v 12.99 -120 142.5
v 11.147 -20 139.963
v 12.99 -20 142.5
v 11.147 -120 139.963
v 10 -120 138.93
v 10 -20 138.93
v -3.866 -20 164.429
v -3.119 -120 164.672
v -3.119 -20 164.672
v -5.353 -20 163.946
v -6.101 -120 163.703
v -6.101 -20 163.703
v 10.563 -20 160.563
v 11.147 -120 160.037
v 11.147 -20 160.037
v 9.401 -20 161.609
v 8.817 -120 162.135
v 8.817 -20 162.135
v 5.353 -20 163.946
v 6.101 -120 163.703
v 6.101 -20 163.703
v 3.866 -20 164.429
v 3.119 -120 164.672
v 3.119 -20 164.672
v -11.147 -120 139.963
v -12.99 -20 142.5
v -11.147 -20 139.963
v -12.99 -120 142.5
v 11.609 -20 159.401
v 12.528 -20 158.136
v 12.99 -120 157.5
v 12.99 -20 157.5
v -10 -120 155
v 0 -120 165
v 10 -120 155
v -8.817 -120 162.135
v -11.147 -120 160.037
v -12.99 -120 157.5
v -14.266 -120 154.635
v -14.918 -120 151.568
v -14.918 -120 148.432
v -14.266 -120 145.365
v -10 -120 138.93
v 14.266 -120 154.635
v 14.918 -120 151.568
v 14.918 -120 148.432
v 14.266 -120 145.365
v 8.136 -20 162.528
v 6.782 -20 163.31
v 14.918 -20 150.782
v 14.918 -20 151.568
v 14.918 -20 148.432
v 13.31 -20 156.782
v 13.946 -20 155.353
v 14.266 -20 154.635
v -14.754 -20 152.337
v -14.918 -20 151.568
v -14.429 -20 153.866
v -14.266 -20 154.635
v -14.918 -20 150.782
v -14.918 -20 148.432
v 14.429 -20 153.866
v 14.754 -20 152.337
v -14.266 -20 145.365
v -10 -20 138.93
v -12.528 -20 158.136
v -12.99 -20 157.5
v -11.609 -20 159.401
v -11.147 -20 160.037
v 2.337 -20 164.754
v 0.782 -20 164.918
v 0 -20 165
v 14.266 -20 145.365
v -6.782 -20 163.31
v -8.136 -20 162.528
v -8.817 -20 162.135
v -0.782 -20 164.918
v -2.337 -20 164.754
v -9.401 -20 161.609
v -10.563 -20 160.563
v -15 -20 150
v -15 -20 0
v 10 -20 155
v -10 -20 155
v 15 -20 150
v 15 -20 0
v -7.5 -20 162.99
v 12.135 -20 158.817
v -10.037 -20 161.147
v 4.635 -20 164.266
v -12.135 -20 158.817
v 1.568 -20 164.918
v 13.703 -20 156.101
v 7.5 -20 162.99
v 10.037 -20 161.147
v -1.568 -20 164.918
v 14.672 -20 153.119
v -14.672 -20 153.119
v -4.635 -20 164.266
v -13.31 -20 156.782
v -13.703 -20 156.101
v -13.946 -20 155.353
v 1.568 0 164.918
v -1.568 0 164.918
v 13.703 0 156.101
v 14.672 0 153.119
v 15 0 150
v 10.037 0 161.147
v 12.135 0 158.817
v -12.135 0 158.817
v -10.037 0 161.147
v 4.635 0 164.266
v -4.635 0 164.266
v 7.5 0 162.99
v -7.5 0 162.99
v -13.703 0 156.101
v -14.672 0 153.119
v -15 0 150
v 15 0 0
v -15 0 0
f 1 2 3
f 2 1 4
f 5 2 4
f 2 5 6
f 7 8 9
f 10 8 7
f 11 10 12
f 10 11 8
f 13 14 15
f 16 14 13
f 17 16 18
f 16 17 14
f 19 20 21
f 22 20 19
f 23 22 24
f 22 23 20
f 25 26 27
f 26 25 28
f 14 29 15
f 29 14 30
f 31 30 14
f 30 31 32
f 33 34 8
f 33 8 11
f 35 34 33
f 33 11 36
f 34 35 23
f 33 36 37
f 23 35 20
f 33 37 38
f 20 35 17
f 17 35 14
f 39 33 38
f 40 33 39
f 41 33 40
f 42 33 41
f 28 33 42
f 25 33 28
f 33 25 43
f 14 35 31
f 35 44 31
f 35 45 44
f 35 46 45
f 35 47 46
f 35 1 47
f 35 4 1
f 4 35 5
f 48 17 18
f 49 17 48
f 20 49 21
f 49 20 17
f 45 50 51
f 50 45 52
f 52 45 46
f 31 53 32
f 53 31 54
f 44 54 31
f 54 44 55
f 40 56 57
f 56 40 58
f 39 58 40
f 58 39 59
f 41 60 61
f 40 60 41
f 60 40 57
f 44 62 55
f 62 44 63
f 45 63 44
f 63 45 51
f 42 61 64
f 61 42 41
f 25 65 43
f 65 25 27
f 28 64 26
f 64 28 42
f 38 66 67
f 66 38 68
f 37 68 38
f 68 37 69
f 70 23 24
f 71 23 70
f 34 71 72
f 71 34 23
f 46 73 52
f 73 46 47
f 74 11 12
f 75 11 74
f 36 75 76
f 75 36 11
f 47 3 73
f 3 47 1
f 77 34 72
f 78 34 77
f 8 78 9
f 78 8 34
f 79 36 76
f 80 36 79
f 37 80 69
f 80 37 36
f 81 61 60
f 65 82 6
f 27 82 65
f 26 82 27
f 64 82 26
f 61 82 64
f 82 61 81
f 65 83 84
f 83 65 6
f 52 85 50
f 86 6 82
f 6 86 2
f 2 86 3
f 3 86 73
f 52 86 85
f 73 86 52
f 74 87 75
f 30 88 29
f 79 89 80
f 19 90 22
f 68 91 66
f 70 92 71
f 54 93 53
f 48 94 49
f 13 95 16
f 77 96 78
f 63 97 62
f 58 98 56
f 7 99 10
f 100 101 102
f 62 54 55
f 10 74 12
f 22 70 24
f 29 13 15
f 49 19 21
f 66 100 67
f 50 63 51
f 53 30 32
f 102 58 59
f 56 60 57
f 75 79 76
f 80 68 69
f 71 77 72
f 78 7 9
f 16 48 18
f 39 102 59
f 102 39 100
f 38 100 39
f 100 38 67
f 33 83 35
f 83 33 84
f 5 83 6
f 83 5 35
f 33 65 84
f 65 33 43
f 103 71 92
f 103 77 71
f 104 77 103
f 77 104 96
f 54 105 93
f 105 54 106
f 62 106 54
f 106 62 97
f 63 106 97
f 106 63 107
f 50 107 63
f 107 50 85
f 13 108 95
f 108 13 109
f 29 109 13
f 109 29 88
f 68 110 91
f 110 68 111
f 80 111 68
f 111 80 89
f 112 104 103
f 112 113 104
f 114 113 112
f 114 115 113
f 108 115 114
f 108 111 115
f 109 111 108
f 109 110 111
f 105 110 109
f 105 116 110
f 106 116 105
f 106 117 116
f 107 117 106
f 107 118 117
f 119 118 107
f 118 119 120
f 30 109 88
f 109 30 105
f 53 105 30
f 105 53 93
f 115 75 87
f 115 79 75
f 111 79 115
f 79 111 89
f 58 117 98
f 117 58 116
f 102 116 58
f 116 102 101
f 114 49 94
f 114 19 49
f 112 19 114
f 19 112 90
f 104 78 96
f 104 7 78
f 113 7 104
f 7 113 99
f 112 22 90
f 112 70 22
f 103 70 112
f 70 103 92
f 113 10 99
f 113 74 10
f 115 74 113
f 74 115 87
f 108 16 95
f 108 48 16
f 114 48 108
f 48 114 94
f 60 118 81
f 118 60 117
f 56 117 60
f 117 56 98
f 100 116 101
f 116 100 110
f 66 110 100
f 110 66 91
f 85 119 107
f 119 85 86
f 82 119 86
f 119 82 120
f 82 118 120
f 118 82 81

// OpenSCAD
/*
handle for active daisha
*/
//active_battery_module();
active_handle();

module active_handle(){

}

color("gray")translate([0,-20,150]) rotate([90,90,0]) {
  difference(){
      cylinder(r=15, h=100);
      translate([-5,-10,-1]) cube([20, 20, 102]);
  }
}
color("black")
union(){
  translate([0,0,150])rotate([90,0,0])cylinder(r=15, h=20);
  translate([-15,-20,0])cube([30, 20, 150]);
}

module active_battery_module(){
  cube([200, 50, 160]);
}
